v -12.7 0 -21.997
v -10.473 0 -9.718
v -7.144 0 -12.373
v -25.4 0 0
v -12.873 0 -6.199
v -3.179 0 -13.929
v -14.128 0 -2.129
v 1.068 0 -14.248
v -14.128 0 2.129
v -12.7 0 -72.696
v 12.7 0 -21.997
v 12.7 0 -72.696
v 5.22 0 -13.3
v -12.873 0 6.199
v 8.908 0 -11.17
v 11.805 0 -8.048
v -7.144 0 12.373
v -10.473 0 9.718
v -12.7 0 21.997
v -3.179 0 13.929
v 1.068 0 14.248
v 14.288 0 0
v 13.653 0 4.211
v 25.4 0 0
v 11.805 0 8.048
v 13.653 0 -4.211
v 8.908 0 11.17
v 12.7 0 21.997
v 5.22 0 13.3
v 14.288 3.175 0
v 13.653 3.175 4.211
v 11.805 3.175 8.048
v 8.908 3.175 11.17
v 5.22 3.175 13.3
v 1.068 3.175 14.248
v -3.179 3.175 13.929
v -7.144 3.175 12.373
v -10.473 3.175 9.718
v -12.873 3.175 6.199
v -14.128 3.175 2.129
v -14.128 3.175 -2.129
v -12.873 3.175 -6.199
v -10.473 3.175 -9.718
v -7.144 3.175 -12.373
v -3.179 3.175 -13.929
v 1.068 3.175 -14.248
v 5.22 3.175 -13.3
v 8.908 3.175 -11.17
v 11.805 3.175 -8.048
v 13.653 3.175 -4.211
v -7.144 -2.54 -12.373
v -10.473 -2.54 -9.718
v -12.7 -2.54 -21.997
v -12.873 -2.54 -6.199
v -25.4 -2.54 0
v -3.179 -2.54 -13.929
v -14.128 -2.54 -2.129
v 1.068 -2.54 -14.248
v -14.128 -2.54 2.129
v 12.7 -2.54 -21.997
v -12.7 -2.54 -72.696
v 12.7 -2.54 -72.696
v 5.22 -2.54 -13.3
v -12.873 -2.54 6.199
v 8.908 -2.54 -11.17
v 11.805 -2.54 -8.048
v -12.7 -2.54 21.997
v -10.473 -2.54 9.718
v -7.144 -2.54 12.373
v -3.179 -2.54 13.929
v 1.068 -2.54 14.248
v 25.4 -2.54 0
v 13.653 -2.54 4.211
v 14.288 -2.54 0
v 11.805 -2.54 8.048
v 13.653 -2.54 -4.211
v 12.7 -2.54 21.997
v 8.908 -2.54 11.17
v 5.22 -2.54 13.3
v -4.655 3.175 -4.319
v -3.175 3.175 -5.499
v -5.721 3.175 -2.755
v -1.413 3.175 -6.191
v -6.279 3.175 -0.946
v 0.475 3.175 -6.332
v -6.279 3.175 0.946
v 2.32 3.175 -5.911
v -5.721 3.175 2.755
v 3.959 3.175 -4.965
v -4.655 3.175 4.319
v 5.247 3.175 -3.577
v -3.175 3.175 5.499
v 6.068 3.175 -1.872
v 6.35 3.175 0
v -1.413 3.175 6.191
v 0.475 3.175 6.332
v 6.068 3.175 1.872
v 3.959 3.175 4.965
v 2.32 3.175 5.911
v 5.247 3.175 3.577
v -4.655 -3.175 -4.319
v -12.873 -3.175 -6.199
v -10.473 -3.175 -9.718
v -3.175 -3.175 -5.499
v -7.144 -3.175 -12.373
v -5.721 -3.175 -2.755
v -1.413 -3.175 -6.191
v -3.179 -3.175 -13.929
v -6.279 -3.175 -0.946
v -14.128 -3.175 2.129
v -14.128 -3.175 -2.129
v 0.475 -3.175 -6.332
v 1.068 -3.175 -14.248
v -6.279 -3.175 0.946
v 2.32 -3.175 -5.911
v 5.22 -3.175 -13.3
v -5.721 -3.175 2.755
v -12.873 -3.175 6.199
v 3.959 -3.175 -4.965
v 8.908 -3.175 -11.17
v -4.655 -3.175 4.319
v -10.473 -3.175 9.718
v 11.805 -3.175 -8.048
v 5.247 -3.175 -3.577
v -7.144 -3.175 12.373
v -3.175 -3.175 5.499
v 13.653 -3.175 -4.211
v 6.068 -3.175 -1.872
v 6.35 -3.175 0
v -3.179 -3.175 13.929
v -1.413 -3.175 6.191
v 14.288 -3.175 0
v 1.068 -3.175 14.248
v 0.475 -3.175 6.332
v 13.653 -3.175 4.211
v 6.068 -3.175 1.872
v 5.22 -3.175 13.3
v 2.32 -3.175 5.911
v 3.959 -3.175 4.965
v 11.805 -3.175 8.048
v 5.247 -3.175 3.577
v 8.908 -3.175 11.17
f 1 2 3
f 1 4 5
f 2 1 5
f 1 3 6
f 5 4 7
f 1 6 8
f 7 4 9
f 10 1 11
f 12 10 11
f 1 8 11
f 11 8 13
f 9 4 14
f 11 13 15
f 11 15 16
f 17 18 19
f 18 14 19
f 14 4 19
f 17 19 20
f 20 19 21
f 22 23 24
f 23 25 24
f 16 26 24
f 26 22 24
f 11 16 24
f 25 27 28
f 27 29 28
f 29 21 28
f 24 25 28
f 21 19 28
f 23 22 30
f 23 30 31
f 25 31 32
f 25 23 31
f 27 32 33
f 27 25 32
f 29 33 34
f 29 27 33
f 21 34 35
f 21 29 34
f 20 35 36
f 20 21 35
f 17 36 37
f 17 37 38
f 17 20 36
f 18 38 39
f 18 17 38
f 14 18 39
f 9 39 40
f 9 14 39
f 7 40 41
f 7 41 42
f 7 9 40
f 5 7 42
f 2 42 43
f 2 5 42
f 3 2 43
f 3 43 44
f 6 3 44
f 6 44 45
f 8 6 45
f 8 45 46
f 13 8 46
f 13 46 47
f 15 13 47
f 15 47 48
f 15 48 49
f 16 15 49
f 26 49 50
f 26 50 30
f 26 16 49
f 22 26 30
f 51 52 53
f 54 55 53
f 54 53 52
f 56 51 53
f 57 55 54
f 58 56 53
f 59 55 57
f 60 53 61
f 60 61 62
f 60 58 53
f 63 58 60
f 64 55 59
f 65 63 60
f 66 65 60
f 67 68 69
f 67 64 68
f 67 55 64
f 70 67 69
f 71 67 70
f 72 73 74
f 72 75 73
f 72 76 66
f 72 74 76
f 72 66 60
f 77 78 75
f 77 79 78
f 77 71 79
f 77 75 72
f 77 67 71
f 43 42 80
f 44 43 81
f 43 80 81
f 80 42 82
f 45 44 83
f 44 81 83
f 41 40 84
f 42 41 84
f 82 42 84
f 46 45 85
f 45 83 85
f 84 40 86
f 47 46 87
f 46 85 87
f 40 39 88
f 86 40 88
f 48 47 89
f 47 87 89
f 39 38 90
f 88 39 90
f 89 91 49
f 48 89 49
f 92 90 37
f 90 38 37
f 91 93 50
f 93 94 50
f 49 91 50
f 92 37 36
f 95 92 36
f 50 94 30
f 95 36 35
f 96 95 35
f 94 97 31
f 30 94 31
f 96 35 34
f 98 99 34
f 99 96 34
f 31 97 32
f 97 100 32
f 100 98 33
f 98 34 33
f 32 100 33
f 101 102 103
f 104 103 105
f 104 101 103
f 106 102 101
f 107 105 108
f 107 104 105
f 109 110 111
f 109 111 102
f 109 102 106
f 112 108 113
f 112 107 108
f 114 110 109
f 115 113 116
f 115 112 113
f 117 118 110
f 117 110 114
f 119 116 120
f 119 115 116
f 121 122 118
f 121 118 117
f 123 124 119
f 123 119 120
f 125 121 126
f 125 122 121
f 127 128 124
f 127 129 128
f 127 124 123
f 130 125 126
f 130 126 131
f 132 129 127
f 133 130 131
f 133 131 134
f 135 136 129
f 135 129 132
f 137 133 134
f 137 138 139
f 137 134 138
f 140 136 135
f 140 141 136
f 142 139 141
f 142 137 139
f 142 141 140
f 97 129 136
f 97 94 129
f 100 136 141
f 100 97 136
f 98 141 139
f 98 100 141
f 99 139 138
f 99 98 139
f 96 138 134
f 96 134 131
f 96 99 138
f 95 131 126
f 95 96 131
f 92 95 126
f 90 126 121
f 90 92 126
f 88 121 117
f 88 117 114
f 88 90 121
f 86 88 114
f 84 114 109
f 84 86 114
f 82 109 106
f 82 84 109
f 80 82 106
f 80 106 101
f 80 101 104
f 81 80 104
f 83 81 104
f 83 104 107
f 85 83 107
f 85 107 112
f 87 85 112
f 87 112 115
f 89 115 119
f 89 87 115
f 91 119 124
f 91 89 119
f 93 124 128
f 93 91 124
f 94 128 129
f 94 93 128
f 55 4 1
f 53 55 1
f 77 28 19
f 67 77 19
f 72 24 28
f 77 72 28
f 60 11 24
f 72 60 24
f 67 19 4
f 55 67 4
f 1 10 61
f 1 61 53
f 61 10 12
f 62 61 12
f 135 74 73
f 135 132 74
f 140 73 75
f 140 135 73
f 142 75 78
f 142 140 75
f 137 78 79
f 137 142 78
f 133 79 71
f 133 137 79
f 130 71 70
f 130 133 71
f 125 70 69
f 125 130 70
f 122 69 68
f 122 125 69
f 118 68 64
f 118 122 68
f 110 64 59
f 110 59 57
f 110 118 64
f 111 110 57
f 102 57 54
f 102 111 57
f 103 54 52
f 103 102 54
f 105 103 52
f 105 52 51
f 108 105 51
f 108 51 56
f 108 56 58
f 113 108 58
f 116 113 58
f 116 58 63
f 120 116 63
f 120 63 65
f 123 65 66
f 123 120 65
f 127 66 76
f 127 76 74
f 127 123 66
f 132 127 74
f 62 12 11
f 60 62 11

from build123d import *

# Parameters (mm, degrees)
F0_R     = 14.2875
F0_W     = 25.4
F0_H     = 50.699268
F1_DEPTH = 2.54
F0_R_2   = 6.35
F2_DEPTH = 3.175


with BuildPart() as f1:
    # F0 (on Front) → F1 (new body)
    with BuildSketch(Plane.XZ):
        Polygon((12.7, 21.997045), (-12.7, 21.997045), (-25.4, 0), (-12.7, -21.997045), (12.7, -21.997045), (25.4, 0), align=None)
        Circle(F0_R, mode=Mode.SUBTRACT)
        with Locations((0, -47.346679)):
            Rectangle(F0_W, F0_H)
    extrude(amount=F1_DEPTH)

    # F0 (on Front) → F2 (join, symmetric)
    with BuildSketch(Plane.XZ):
        Circle(F0_R)
        Circle(F0_R_2, mode=Mode.SUBTRACT)
    extrude(amount=F2_DEPTH, both=True)


solid = f1.part
